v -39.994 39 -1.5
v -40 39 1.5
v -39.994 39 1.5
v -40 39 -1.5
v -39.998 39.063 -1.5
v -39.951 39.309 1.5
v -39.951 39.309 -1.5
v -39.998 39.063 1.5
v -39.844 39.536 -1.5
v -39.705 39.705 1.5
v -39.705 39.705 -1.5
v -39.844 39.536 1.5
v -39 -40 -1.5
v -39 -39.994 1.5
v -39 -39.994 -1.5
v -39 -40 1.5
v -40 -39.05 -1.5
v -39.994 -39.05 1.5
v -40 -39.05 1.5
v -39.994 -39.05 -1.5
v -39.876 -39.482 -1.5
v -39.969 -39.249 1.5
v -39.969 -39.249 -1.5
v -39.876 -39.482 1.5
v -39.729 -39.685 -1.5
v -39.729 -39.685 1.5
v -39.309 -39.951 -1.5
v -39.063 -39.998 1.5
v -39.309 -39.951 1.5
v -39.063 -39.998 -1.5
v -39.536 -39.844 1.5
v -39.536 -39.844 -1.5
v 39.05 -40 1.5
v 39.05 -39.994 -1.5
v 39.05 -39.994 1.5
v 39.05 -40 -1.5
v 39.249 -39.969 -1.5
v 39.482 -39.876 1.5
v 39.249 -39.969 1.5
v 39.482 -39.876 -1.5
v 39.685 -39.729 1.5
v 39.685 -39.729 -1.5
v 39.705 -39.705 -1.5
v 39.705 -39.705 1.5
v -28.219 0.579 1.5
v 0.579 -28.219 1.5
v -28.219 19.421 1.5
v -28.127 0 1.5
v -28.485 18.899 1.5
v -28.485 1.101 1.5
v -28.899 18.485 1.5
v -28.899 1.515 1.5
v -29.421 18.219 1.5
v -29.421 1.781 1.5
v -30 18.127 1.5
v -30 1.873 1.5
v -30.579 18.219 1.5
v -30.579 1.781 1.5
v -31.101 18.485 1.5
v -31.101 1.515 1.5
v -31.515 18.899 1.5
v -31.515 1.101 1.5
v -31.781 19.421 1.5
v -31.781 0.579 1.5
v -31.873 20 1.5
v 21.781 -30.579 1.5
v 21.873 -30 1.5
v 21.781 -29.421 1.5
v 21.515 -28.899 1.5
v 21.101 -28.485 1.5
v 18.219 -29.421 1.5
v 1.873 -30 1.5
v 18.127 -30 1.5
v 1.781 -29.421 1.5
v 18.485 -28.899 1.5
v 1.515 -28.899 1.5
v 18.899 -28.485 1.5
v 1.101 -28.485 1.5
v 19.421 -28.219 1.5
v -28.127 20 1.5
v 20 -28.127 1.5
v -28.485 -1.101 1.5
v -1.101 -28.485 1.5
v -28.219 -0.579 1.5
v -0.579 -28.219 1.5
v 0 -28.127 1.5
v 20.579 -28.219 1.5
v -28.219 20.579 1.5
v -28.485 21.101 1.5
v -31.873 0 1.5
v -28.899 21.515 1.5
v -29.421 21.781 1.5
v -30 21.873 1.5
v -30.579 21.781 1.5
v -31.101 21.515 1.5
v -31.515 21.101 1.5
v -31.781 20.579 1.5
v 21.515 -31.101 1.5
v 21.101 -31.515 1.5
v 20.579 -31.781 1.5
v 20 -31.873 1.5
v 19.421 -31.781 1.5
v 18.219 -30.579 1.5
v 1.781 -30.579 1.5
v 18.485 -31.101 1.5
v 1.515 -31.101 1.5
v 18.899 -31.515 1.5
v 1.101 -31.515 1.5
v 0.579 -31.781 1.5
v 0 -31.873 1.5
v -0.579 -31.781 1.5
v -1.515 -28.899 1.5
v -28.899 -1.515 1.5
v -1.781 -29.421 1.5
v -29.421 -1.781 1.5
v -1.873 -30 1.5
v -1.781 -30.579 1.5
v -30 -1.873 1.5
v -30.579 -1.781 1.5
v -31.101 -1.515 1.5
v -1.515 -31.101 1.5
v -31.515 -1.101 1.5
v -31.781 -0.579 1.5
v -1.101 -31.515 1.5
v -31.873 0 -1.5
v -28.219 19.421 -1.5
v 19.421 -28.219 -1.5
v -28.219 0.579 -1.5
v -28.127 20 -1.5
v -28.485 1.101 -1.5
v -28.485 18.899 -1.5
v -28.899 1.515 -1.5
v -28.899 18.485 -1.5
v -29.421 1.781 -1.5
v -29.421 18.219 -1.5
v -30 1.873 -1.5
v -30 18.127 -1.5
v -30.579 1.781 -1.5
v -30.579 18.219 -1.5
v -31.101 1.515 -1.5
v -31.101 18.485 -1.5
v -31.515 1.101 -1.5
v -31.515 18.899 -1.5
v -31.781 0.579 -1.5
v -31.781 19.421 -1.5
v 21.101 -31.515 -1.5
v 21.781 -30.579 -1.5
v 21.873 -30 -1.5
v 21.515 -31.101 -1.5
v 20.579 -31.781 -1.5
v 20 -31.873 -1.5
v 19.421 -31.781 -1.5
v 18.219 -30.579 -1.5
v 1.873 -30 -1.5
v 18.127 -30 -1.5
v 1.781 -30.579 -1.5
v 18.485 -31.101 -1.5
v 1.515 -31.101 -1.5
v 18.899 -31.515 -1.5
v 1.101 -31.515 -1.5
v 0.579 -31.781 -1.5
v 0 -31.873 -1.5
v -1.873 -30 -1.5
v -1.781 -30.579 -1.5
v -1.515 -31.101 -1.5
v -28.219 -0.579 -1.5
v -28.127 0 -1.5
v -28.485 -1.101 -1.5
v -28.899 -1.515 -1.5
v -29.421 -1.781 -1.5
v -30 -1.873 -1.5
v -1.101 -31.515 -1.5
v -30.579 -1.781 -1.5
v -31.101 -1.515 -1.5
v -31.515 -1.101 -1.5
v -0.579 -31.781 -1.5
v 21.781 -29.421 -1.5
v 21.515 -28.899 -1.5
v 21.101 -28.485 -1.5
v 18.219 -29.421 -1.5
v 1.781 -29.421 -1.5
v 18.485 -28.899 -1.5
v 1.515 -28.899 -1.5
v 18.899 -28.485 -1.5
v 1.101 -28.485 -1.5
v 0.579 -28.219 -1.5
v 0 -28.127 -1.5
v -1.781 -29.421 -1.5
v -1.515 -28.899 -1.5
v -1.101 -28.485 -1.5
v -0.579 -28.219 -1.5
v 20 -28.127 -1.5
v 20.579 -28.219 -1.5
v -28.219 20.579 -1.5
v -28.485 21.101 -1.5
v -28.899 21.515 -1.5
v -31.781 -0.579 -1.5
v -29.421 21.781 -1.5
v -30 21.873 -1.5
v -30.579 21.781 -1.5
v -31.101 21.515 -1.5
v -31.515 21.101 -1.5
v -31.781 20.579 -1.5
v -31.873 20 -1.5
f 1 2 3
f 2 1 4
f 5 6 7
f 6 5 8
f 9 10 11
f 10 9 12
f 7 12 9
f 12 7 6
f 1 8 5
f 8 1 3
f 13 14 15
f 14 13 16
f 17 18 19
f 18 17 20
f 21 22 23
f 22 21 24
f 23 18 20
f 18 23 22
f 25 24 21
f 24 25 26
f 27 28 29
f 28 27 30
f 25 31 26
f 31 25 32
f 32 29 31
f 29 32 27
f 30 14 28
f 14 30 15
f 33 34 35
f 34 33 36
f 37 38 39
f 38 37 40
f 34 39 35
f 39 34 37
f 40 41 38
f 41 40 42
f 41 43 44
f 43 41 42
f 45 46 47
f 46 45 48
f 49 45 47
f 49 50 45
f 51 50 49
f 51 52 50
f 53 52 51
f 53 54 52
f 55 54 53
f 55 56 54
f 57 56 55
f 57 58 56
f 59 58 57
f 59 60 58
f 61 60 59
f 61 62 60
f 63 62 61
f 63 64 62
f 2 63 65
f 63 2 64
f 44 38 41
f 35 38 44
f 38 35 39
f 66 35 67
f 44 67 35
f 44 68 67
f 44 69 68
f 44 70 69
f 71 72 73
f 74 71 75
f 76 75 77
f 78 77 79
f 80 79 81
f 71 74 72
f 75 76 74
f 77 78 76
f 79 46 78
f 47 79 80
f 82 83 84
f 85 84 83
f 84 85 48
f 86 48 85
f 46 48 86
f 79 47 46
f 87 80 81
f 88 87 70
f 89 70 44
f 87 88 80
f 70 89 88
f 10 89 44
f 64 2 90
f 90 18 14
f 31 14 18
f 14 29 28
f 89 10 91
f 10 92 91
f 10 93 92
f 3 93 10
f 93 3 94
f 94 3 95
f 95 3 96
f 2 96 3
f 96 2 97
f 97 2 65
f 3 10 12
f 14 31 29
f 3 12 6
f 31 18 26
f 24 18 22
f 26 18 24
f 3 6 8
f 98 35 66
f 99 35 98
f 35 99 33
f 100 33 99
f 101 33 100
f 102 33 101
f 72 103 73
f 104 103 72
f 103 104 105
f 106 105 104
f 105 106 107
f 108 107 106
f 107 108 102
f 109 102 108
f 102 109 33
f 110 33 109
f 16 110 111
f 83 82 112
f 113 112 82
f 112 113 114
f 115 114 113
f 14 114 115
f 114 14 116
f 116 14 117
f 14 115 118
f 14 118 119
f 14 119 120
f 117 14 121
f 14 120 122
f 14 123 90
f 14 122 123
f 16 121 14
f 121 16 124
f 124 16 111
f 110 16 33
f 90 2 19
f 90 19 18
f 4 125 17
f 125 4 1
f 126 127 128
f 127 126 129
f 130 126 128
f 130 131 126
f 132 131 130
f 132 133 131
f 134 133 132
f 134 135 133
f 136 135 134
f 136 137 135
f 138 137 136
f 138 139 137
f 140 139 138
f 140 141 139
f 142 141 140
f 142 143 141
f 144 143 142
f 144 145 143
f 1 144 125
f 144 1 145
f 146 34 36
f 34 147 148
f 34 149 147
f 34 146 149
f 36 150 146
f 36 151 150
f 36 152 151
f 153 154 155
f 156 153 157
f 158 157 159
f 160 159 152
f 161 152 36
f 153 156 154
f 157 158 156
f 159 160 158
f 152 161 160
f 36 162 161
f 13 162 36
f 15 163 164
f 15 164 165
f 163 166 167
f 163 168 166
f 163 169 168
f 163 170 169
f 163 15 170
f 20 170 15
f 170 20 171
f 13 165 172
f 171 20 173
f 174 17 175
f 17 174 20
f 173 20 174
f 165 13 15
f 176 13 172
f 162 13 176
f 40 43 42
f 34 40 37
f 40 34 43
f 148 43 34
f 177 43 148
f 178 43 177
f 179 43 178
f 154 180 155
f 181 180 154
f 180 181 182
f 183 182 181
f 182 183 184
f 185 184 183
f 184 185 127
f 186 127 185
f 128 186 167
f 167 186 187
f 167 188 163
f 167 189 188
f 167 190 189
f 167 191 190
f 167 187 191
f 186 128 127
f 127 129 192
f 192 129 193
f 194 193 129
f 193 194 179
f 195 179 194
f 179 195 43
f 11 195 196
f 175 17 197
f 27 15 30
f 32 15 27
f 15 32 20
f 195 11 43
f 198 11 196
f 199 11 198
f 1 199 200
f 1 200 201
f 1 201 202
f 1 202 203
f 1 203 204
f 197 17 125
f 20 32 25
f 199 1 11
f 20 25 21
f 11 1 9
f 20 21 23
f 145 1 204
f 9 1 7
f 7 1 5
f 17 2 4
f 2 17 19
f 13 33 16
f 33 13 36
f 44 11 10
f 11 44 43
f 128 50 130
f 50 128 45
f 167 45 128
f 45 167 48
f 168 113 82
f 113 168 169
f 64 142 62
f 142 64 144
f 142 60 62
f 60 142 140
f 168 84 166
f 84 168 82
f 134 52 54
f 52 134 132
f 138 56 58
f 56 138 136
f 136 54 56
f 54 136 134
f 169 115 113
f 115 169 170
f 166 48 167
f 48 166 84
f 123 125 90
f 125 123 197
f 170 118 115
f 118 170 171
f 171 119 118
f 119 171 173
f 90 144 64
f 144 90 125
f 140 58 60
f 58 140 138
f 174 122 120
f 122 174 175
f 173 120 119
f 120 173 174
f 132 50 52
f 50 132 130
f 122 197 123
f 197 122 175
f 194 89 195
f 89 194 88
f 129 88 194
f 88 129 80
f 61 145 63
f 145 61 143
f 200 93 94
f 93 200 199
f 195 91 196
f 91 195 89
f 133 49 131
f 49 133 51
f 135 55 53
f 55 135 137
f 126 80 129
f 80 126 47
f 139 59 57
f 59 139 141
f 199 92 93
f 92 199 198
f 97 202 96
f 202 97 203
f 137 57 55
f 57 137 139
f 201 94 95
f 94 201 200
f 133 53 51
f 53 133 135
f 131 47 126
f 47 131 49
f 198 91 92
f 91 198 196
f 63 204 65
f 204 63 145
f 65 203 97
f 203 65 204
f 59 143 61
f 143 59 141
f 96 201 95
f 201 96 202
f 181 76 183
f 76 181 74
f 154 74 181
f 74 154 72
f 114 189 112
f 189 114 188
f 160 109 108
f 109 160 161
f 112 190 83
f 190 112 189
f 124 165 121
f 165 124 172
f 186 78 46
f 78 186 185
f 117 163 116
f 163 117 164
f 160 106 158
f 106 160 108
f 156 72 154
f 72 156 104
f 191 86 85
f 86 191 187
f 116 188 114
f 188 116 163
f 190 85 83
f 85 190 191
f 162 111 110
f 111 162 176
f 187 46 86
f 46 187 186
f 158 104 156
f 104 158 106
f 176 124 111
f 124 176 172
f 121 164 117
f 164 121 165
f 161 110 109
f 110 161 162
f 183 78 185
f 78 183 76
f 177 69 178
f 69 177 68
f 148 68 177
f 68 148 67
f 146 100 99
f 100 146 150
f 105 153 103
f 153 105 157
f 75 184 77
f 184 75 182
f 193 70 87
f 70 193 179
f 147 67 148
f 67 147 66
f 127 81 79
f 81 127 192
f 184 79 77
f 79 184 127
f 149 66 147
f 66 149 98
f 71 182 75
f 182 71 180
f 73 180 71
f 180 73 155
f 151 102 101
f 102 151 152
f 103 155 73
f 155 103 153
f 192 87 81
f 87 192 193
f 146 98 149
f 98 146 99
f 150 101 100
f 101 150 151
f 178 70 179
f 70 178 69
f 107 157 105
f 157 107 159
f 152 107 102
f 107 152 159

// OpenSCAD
// Minimum needed is 0.02 to ensure properly punched holes. 
holeCreationOffset=0.05;
//How wide the extrusion is
extrusionWidth=20;//[15,20]
extrusionHeight=extrusionWidth;
//How thick the bracket will be, 3 is the default
bracketThickess=3; //[1:10]
bracketLength=extrusionWidth * 4;
triangle2=bracketLength/2;
// M3 or M5 holes
boltHoleDiameter=3.7;//[3.7,5.68]
boltHoleRadius=boltHoleDiameter/2;
squareDiagonal=(bracketLength*sqrt(2));

echo(squareDiagonal);

module cylinder_outer(height,radius,fn){
   fudge = 1/cos(180/fn);
   cylinder(h=height,r=radius*fudge,$fn=fn, center = true);
}
   
module cylinder_outerdual(height,radius,radiustwo,fn){
   fudge = 1/cos(180/fn);
   cylinder(h=height,r1=radius*fudge,r2=radiustwo*fudge,$fn=fn, center = true);
}
   
module cylinder_mid(height,radius,fn){
   fudge = (1+1/cos(180/fn))/2;
   cylinder(h=height,r=radius*fudge,$fn=fn, center = true);
}
   
module createMeniscus(h,radius) {// This module creates the shape that needs to be substracted from a cube to make its corners rounded.
    difference(){        //This shape is basicly the difference between a quarter of cylinder and a cube
       translate([radius/2+0.1,radius/2+0.1,0]){
          cube([radius+0.2,radius+0.1,h+0.2],center=true);         // All that 0.x numbers are to avoid "ghost boundaries" when substracting
       }

       cylinder(h=h+0.2,r=radius,$fn = 25,center=true);
    }
}

module roundCornersCube(x,y,z,r){  // Now we just substract the shape we have created in the four corners
    difference(){
       cube([x,y,z], center=true);

    translate([x/2-r,y/2-r]){  // We move to the first corner (x,y)
          rotate(0){  
             createMeniscus(z,r); // And substract the meniscus
          }
       }
       translate([-x/2+r,y/2-r]){ // To the second corner (-x,y)
          rotate(90){
             createMeniscus(z,r); // But this t�ime we have to rotate the meniscus 90 deg
          }
       }
          translate([-x/2+r,-y/2+r]){ // ... 
          rotate(180){
             createMeniscus(z,r);
          }
       }
          translate([x/2-r,-y/2+r]){
          rotate(270){
             createMeniscus(z,r);
          }
       }
    }
}

module cornerBracket(){
    difference (){
        color([0,0,1]) roundCornersCube(bracketLength, bracketLength,bracketThickess, 1);
        translate([extrusionWidth/2,extrusionWidth/2,0]) rotate([0,0,45]) cube([extrusionHeight, extrusionWidth * 2,bracketThickess + 1], center=true);
        translate([squareDiagonal/4,squareDiagonal/4,0])  rotate([0,0,45]) cube([bracketLength, bracketLength*2,bracketThickess + 1], center=true);
        
        translate(v = [ -(bracketLength/2) + (extrusionWidth/2), -(bracketLength/2) + (extrusionWidth) + extrusionWidth, 0 ]) cylinder_outer(bracketThickess * 2,boltHoleRadius,20);
        translate(v = [ -(bracketLength/2) + (extrusionWidth/2),-(bracketLength/2) + (extrusionWidth * 2)+ extrusionWidth , 0 ]) cylinder_outer(bracketThickess * 2,boltHoleRadius,20);


        translate(v = [ -(bracketLength/2) + (extrusionWidth ) + extrusionWidth,-(bracketLength/2) + (extrusionWidth/2), 0 ]) cylinder_outer(bracketThickess * 2,boltHoleRadius,20);
        translate(v = [ -(bracketLength/2) + (extrusionWidth * 2) + extrusionWidth,-(bracketLength/2) + (extrusionWidth/2), 0 ]) cylinder_outer(bracketThickess * 2,boltHoleRadius,20);
    }
    
}

cornerBracket();
